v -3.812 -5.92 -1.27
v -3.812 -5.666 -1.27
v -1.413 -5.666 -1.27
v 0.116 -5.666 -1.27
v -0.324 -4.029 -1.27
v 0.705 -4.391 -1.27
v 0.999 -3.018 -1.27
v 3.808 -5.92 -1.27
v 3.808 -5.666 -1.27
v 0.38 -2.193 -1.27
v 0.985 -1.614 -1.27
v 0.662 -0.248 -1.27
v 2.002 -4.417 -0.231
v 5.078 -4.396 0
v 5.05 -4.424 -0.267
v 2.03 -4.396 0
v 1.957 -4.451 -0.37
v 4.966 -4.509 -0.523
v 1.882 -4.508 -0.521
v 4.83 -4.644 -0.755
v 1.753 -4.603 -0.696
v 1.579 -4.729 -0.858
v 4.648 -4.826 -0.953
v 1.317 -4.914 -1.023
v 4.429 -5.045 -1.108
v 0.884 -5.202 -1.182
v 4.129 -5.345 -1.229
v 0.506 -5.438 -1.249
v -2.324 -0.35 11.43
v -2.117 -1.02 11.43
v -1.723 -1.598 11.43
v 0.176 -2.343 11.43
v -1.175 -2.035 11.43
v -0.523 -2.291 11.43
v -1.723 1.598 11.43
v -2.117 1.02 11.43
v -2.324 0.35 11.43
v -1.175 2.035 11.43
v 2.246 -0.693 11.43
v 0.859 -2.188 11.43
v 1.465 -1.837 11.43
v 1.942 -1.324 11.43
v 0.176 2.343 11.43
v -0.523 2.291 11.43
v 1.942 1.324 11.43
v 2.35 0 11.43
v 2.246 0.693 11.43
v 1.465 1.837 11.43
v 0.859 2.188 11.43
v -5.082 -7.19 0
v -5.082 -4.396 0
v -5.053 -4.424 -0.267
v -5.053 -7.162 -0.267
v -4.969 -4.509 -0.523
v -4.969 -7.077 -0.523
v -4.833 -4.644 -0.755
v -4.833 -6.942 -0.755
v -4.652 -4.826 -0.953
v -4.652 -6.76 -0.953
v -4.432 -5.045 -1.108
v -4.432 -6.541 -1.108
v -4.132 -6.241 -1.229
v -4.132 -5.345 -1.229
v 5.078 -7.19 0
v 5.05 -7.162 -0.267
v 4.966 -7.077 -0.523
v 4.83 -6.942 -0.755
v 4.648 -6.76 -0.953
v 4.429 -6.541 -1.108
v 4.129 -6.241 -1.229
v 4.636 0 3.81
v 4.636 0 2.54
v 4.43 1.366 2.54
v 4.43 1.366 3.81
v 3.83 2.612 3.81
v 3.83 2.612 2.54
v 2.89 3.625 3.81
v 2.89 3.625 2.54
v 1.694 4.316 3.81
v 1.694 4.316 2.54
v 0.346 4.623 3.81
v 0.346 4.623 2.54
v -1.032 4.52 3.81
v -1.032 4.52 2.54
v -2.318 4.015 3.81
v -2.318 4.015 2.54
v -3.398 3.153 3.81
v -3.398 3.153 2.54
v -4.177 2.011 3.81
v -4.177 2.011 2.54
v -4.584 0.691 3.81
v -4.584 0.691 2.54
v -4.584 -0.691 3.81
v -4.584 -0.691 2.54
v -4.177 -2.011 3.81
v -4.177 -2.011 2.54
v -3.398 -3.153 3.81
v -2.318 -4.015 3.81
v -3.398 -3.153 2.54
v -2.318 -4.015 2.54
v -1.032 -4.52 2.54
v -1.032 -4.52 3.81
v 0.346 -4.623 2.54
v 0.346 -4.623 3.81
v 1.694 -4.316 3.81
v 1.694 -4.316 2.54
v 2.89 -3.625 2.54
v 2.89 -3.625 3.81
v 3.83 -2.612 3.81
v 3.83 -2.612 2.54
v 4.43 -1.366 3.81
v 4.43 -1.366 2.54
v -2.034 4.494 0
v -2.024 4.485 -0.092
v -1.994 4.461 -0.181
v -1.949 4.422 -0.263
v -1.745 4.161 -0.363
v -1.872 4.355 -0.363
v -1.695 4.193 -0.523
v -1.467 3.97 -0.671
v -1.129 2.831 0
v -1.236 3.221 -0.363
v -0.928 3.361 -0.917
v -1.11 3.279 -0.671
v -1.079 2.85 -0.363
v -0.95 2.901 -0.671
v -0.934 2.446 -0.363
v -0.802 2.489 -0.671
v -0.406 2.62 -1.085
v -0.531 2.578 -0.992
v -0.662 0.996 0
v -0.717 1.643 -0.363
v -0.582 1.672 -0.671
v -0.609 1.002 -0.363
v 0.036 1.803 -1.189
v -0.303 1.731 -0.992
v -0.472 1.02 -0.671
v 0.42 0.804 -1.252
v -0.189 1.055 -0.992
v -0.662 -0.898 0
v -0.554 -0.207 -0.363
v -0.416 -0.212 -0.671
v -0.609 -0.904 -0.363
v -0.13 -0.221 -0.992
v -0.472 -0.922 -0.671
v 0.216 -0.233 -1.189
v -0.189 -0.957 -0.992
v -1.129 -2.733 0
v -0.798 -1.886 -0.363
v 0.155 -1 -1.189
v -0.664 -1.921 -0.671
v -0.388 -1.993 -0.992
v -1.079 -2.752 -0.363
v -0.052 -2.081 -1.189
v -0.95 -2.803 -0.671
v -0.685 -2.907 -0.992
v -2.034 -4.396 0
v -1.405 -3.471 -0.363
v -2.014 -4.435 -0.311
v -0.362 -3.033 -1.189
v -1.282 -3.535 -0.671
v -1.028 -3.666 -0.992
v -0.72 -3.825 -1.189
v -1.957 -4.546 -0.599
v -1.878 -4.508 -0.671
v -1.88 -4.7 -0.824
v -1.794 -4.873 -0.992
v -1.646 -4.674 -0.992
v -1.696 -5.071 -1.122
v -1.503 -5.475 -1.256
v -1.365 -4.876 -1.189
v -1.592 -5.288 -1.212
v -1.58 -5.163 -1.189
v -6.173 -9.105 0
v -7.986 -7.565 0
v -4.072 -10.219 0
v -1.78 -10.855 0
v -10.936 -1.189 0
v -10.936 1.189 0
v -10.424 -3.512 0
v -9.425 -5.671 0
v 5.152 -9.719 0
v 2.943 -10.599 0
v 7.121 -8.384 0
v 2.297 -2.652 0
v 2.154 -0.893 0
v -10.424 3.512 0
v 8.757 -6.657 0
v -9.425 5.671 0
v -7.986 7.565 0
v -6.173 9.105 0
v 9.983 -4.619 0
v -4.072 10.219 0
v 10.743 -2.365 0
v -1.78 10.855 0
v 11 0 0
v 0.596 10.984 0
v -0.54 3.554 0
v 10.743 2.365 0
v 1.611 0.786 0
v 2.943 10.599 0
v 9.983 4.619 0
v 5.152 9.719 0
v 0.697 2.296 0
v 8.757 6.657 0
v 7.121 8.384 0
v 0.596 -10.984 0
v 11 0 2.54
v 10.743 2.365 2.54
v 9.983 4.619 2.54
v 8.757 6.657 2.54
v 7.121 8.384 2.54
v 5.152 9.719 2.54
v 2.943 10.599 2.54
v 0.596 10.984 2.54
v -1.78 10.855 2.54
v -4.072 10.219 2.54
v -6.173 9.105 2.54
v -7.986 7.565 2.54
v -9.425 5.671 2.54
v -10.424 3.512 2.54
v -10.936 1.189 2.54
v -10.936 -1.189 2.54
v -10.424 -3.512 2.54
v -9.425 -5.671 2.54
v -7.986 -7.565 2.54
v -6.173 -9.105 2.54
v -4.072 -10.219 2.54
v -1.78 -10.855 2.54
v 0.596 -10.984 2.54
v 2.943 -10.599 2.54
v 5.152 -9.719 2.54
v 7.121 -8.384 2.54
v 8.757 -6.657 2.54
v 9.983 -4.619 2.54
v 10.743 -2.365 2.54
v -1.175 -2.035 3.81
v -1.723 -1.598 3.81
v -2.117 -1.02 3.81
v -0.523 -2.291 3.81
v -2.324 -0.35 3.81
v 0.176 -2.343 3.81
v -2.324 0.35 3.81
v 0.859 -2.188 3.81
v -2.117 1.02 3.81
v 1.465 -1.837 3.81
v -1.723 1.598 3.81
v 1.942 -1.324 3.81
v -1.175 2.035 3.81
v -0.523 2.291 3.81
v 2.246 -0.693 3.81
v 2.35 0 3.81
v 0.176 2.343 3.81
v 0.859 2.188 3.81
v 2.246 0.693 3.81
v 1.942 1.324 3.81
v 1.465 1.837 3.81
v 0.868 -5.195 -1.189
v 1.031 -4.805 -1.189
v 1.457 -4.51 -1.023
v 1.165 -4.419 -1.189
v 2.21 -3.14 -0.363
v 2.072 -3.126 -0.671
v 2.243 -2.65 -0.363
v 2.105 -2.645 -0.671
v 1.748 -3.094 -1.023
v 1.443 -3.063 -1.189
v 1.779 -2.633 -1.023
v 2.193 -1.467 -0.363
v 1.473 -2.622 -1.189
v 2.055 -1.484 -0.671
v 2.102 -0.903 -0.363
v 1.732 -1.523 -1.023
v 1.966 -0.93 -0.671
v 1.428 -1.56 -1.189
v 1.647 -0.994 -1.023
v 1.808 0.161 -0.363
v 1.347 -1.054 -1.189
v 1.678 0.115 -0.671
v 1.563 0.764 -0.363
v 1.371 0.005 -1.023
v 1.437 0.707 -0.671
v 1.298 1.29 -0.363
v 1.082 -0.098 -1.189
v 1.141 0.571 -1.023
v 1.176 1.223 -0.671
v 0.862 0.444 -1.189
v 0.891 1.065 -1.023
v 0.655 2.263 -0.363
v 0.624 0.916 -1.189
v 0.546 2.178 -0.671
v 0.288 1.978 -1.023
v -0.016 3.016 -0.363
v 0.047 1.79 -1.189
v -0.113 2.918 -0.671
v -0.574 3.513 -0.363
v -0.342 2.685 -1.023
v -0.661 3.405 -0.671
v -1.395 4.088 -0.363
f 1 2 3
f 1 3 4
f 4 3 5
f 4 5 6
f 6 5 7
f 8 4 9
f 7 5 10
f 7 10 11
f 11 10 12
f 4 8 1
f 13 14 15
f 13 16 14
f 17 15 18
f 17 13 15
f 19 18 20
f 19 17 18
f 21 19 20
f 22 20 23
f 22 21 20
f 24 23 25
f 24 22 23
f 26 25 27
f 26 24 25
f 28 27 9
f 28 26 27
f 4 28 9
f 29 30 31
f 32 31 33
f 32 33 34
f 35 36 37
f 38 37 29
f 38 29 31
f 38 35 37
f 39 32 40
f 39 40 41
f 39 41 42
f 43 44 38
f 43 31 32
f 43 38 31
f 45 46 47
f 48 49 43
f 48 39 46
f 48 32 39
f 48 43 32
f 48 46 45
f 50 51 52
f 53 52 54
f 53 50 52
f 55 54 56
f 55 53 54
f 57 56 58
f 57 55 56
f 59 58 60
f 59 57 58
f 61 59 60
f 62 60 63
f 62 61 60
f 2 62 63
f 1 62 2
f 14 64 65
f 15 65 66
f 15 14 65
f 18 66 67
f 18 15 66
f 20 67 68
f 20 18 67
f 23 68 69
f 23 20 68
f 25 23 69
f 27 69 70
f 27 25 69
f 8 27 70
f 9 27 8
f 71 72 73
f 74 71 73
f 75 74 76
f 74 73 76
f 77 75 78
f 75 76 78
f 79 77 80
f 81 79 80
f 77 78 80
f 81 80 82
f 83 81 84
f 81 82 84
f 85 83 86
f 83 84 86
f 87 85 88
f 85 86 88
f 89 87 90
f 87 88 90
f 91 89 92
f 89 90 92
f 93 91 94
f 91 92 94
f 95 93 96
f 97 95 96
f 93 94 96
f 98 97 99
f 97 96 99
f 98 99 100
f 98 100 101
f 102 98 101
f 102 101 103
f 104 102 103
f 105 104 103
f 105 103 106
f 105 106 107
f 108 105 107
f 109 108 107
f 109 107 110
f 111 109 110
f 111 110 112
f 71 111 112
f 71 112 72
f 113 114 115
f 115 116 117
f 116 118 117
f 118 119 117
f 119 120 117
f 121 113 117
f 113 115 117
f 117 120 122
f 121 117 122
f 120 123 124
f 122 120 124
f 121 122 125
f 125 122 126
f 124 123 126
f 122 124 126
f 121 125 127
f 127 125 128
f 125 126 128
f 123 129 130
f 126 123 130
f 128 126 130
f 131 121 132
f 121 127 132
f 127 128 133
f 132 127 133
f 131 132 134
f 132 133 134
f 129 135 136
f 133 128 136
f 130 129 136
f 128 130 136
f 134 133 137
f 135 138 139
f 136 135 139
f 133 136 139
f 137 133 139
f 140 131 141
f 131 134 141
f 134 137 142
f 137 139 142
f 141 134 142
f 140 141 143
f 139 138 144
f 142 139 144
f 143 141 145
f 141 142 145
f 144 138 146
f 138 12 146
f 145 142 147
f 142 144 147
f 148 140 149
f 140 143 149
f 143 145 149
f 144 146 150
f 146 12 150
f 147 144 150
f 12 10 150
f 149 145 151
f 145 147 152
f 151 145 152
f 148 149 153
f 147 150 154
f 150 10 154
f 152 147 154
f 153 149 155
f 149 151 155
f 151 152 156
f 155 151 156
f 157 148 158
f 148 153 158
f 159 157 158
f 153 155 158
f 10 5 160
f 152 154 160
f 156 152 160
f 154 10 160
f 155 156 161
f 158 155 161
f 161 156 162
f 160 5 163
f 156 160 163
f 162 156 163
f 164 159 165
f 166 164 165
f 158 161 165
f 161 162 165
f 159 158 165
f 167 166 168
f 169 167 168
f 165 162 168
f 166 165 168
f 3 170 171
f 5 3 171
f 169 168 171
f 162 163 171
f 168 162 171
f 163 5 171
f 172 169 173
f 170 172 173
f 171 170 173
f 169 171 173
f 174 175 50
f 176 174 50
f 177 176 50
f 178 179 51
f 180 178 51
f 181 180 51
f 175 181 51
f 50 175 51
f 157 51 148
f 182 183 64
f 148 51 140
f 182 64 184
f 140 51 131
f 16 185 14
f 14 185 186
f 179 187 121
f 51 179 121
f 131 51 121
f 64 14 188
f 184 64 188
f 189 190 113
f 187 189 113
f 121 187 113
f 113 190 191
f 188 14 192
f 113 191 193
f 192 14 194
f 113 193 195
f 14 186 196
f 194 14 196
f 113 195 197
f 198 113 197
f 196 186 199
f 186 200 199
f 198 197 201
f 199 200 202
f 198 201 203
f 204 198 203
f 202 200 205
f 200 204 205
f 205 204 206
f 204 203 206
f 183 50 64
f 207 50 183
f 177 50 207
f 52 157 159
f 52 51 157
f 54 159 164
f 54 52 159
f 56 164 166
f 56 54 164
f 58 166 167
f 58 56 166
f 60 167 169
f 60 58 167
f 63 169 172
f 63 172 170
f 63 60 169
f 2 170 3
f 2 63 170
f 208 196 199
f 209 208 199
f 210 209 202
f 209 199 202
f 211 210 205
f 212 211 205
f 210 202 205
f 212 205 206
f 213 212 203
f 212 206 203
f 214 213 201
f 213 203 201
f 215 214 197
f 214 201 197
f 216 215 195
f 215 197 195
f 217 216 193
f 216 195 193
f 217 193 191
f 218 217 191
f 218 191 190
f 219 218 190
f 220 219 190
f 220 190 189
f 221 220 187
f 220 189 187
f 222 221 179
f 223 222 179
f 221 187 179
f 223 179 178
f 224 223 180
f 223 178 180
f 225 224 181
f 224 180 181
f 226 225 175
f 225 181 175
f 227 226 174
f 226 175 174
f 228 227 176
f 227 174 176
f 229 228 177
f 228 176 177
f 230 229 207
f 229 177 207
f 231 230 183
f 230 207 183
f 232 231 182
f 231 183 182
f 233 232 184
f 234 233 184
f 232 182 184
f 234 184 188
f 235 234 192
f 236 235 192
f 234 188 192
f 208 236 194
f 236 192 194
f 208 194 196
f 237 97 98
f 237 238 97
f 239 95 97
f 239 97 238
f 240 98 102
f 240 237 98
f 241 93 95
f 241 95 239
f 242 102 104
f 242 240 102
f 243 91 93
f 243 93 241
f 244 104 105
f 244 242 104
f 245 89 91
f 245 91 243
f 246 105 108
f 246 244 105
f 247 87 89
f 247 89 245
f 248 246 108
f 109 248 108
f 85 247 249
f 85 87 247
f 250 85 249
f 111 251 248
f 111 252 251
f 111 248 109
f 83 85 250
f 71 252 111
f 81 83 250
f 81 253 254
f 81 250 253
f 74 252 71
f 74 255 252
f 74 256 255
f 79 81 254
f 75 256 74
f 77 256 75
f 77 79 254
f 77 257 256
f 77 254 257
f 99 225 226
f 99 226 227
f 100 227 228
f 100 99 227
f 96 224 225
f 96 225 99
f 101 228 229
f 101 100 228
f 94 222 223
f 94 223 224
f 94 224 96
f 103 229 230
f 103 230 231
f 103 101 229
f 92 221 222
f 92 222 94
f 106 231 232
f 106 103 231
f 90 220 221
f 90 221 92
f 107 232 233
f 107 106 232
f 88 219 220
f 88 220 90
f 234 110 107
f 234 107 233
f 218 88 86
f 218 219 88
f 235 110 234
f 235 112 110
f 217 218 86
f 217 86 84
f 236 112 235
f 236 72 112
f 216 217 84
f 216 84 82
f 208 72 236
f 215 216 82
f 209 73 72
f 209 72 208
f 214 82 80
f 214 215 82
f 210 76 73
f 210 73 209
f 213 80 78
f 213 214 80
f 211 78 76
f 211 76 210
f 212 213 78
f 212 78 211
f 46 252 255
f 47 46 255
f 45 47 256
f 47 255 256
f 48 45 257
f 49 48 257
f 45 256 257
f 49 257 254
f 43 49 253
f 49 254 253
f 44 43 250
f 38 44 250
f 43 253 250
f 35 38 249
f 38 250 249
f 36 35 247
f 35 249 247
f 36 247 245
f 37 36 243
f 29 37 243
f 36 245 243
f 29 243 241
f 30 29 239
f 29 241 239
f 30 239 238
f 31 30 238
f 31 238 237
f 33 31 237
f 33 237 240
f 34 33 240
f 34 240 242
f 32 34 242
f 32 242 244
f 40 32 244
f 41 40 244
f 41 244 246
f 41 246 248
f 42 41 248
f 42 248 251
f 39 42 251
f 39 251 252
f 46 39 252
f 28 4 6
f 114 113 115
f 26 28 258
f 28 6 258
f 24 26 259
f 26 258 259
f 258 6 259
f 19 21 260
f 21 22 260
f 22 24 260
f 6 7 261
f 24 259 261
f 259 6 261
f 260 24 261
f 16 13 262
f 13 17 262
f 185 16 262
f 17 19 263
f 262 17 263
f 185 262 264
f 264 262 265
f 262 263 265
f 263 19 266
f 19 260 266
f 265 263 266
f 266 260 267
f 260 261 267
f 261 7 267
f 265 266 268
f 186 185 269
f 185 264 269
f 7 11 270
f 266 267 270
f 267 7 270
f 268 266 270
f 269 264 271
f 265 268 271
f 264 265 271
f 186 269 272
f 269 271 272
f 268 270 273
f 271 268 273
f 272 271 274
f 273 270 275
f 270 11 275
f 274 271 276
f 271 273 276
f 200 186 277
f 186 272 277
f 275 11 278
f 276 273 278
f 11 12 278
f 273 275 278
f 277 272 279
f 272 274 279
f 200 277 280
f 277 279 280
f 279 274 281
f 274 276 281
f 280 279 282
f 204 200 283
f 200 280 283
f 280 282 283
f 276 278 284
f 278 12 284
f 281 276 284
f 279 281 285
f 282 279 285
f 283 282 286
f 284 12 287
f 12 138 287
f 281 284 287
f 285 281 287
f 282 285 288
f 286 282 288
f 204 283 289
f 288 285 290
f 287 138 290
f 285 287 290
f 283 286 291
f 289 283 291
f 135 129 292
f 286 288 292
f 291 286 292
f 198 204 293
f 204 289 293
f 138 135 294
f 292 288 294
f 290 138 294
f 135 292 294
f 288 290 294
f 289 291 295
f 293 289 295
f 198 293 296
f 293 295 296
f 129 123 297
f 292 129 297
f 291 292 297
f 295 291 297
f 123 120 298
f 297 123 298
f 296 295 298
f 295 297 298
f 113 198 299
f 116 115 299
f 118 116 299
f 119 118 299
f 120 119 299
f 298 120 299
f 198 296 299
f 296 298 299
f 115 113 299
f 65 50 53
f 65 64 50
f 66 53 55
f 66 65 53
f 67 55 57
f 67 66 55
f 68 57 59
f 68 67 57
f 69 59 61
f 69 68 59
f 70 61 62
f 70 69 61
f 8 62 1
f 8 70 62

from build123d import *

# Parameters (mm, degrees)
F0_R     = 2.35
F1_DEPTH = 11.43
F0_R_2   = 4.636
F2_DEPTH = 3.81
F0_R_3   = 11
F3_DEPTH = 2.54
F5_DEPTH = 1.27
F6_R     = 1.26999


# Not quite as in the source:
# - a fillet or chamfer is up to 0.001 mm smaller than in the source, because OpenCascade refuses the exact size


with BuildPart() as f1:
    # F0 (on Top) → F1 (new body)
    with BuildSketch(Plane.XY):
        Circle(F0_R)
    extrude(amount=F1_DEPTH)

    # F0 (on Top) → F2 (join)
    with BuildSketch(Plane.XY):
        Circle(F0_R_2)
        Circle(F0_R, mode=Mode.SUBTRACT)
    extrude(amount=F2_DEPTH)

    # F0 (on Top) → F3 (join)
    with BuildSketch(Plane.XY):
        Circle(F0_R_3)
        Circle(F0_R_2, mode=Mode.SUBTRACT)
    extrude(amount=F3_DEPTH)

    # F4 (on face) → F5 (join)
    with BuildSketch(Plane.XY):
        with BuildLine():
            Line((-5.0818, -4.396), (-5.0818, -7.19))
            Line((-5.0818, -7.19), (5.0782, -7.19))
            Line((5.0782, -7.19), (5.0782, -4.396))
            Line((5.0782, -4.396), (2.0302, -4.396))
            ThreePointArc((2.0302, -4.396), (1.611480541, 0.7864996759), (-2.0338, 4.494))
            ThreePointArc((-2.0338, 4.494), (-0.603014409, 0.049), (-2.0338, -4.396))
            Line((-2.0338, -4.396), (-5.0818, -4.396))
        make_face()
    extrude(amount=-F5_DEPTH)

    # F6 (radius 1.27 in the source; OpenCascade refuses exactly that, so slightly less here)
    f6_edges = [f1.edges().sort_by_distance(p)[0] for p in [
        (5.0782, -5.793, -1.27),
        (-5.0818, -5.793, -1.27),
        (-0.0018, -7.19, -1.27),
        (-3.5578, -4.396, -1.27),
        (3.5542, -4.396, -1.27),
        (1.611481, 0.7865, -1.27),
        (-0.603014, 0.049, -1.27),
    ]]
    fillet(f6_edges, radius=F6_R)


solid = f1.part
